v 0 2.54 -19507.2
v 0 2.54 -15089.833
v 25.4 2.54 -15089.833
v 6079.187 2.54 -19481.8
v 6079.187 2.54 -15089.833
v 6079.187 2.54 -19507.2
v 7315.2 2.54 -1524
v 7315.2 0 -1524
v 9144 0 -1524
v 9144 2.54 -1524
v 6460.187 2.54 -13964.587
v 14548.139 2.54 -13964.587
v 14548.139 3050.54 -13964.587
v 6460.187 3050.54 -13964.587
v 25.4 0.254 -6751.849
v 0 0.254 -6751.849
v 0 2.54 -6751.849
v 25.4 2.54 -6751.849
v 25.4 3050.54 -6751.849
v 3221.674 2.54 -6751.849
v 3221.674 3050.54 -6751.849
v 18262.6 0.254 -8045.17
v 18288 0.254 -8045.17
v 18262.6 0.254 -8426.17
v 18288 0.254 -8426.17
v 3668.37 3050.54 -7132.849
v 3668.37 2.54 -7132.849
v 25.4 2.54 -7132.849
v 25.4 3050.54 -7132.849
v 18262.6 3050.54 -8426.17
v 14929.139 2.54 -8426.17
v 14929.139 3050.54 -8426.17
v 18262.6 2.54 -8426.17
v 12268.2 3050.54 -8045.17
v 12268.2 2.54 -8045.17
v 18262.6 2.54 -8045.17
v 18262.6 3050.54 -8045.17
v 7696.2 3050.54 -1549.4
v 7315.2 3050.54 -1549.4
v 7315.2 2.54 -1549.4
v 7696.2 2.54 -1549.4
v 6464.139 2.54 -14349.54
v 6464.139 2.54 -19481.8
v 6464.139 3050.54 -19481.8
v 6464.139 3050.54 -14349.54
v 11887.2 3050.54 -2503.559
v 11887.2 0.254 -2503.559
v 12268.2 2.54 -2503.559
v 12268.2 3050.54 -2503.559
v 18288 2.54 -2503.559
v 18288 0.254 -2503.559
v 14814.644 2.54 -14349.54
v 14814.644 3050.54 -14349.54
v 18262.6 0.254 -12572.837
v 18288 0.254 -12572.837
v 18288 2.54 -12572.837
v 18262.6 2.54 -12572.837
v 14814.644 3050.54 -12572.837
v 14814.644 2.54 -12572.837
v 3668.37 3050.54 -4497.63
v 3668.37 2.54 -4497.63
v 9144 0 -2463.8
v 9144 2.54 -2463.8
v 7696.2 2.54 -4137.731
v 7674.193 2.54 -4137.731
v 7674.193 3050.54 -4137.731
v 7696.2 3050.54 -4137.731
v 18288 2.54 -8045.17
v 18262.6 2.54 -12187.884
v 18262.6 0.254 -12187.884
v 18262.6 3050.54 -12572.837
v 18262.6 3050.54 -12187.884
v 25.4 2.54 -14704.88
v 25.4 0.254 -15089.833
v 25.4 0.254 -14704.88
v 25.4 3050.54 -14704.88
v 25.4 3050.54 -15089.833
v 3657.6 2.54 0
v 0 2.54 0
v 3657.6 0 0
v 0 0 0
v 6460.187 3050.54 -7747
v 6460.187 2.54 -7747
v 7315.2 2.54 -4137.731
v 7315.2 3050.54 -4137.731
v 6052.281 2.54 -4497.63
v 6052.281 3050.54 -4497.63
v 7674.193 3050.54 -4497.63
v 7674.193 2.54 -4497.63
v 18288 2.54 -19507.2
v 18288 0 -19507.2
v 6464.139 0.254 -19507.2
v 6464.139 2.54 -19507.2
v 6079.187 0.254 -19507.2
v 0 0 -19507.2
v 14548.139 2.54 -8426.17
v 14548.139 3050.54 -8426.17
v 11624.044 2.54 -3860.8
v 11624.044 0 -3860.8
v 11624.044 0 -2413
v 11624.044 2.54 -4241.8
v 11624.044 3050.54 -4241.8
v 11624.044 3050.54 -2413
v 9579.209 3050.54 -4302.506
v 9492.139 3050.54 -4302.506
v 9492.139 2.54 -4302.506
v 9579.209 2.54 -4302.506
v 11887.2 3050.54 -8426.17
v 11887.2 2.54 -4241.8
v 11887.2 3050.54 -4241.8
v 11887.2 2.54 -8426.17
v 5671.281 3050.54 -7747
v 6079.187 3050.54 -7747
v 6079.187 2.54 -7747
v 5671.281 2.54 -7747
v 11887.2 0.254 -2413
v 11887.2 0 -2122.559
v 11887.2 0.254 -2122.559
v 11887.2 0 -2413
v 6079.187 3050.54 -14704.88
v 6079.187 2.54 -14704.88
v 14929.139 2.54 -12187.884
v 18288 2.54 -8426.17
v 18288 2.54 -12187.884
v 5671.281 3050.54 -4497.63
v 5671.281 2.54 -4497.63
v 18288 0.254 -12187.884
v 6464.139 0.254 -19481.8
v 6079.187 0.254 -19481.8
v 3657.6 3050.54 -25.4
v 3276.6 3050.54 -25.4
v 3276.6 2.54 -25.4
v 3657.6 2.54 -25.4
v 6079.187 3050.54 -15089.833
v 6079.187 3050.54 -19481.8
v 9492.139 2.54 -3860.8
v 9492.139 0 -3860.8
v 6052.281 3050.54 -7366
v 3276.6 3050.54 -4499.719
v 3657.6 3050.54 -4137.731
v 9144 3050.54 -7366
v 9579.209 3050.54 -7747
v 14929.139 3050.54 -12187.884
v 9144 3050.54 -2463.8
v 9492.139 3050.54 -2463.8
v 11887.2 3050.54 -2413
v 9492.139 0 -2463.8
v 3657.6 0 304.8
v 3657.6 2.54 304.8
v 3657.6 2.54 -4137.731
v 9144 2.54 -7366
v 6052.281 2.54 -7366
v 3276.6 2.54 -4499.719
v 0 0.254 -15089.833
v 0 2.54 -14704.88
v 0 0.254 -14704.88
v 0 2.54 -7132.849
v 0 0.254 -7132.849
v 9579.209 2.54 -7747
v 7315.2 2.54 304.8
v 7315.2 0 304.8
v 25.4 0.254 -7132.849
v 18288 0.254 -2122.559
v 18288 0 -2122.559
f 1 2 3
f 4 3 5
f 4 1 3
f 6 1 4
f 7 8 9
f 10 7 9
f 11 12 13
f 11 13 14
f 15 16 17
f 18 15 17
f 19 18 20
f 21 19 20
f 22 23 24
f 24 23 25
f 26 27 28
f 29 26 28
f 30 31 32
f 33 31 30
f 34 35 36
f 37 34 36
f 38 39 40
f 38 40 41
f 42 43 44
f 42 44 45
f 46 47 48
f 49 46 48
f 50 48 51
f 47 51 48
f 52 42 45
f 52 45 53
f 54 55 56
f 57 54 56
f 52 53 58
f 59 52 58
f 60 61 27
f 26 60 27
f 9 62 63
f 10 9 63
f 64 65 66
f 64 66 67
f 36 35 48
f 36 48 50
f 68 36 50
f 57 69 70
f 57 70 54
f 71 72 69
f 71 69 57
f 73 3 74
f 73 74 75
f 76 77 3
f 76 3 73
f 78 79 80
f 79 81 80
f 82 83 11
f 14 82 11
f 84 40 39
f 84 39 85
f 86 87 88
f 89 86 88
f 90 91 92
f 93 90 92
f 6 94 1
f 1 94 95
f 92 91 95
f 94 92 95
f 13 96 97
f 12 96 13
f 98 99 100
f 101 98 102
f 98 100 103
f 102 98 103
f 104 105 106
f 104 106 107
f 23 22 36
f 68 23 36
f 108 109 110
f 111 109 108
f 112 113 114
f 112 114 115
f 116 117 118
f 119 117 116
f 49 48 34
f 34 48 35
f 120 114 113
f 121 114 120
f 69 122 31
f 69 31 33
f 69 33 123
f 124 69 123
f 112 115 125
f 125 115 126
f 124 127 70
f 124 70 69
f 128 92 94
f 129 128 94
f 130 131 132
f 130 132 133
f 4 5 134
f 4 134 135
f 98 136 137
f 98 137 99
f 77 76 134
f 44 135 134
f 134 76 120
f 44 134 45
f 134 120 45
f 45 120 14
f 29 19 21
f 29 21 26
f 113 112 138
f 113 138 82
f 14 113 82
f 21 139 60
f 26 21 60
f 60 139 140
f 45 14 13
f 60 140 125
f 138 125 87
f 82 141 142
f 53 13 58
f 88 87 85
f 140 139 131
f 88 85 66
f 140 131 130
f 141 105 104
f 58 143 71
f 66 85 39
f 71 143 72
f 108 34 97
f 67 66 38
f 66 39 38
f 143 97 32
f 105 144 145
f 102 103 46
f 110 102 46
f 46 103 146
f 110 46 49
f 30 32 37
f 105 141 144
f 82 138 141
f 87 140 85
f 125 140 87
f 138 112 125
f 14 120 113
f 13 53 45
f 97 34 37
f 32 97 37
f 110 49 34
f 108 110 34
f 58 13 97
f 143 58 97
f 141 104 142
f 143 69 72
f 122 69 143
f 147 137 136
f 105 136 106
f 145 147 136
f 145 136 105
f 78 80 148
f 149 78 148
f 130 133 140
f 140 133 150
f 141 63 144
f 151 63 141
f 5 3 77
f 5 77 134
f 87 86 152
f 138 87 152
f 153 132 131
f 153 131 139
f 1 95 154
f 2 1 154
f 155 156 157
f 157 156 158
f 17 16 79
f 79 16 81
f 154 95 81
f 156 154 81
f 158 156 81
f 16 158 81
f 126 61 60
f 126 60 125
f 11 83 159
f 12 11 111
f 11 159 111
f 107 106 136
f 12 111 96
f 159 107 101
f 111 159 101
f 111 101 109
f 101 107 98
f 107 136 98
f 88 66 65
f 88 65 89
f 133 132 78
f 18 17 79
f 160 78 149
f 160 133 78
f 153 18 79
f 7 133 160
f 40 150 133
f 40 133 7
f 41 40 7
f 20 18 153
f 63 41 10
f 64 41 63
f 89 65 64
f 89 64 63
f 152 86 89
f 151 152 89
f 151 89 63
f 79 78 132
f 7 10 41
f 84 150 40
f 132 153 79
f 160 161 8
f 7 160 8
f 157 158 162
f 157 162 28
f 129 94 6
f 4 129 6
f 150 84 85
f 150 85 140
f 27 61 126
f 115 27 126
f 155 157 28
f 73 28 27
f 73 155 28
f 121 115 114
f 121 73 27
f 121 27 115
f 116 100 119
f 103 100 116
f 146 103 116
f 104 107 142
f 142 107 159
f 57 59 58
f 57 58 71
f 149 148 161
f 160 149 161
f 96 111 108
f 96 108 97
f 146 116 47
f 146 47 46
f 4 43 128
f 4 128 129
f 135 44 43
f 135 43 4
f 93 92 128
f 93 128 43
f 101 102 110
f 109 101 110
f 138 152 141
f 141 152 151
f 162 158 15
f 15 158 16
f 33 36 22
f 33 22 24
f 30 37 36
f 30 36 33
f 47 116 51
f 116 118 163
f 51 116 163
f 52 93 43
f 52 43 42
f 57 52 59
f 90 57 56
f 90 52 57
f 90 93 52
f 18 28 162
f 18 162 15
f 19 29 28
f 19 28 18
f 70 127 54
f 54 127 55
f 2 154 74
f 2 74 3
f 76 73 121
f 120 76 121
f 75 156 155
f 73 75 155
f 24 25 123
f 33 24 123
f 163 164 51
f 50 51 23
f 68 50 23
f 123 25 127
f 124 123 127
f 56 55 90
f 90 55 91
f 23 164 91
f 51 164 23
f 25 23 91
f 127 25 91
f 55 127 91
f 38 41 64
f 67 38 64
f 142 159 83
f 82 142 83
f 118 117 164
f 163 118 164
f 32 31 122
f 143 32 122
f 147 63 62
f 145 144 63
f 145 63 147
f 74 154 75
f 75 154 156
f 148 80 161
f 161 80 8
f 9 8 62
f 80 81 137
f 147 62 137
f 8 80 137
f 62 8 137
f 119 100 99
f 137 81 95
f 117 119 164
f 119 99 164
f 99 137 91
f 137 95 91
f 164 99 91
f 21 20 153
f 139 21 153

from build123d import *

# Parameters (mm, degrees)
BOSS_EXTRUDE1_DEPTH  = 2.54
BOSS_EXTRUDE2_DEPTH  = 3048
SKETCH3_W            = 6079.186928171
SKETCH3_H            = 384.95236651
BOSS_EXTRUDE3_DEPTH  = 3048
SKETCH4_W            = 6400.8
SKETCH4_H            = 381
BOSS_EXTRUDE4_DEPTH  = 3048
SKETCH5_W            = 435.20922465
SKETCH5_H            = 5334
BOSS_EXTRUDE5_DEPTH  = 3048
SKETCH6_W            = 381
SKETCH6_H            = 5922.610446976
BOSS_EXTRUDE7_DEPTH  = 3048
SKETCH7_W            = 6019.8
SKETCH7_H            = 381
BOSS_EXTRUDE8_DEPTH  = 3048
SKETCH8_W            = 381
SKETCH8_H            = 2613.731165123
BOSS_EXTRUDE9_DEPTH  = 3048
SKETCH9_W            = 381
SKETCH9_H            = 4182.504999838
BOSS_EXTRUDE10_DEPTH = 3048
SKETCH10_W           = 4005.822591779
SKETCH10_H           = 359.898893292
BOSS_EXTRUDE11_DEPTH = 3048
BOSS_EXTRUDE12_DEPTH = 3048
BOSS_EXTRUDE13_DEPTH = 3048
SKETCH14_W           = 381
SKETCH14_H           = 6217.587376367
BOSS_EXTRUDE15_DEPTH = 3048
SKETCH16_W           = 6400.8
SKETCH16_H           = 2122.559144169
CUT_EXTRUDE2_DEPTH   = 3048
SKETCH18_W           = 381
SKETCH18_H           = 3761.714555176
BOSS_EXTRUDE16_DEPTH = 3048
BOSS_EXTRUDE17_DEPTH = 3048
SKETCH20_W           = 381
SKETCH20_H           = 3048
CUT_EXTRUDE3_DEPTH   = 25.4
SKETCH21_W           = 381
SKETCH21_H           = 3048
CUT_EXTRUDE4_DEPTH   = 25.4
SKETCH22_W           = 2307.99077535
SKETCH22_H           = 3048
BOSS_EXTRUDE18_DEPTH = 1828.8
SKETCH23_W           = 2131.904617106
SKETCH23_H           = 3050.54
CUT_EXTRUDE5_DEPTH   = 1447.8
SKETCH24_W           = 348.138899176
SKETCH24_H           = 3050.54
CUT_EXTRUDE6_DEPTH   = 50.8
SKETCH26_W           = 2131.904617106
SKETCH26_H           = 3048
CUT_EXTRUDE7_DEPTH   = 441.706
SKETCH28_W           = 6400.8
SKETCH28_H           = 3050.286
CUT_EXTRUDE9_DEPTH   = 381
SKETCH29_W           = 384.95236651
SKETCH29_H           = 3050.286
CUT_EXTRUDE10_DEPTH  = 25.4
SKETCH30_W           = 381
SKETCH30_H           = 3050.286
CUT_EXTRUDE11_DEPTH  = 25.4
SKETCH31_W           = 381
SKETCH31_H           = 3050.286
CUT_EXTRUDE12_DEPTH  = 25.4
SKETCH32_W           = 384.95236651
SKETCH32_H           = 3050.286
CUT_EXTRUDE13_DEPTH  = 25.4
SKETCH33_W           = 384.95236651
SKETCH33_H           = 3050.286
CUT_EXTRUDE14_DEPTH  = 25.4


with BuildPart() as part:
    # Sketch1 → Boss-Extrude1 (new body)
    with BuildSketch(Plane(origin=(0, 0, 0), x_dir=(1, 0, 0), z_dir=(0, 1, 0))):
        Polygon((3657.6, 0), (3657.6, -304.8), (7315.2, -304.8), (7315.2, 0), (7315.2, 1524), (9144, 1524), (9144, 2413), (11887.2, 2413), (11887.2, 0), (18288, 0), (18288, 19507.2), (0, 19507.2), (0, 0), align=None)
    extrude(amount=BOSS_EXTRUDE1_DEPTH)

    # Sketch2 → Boss-Extrude2 (add)
    with BuildSketch(Plane(origin=(0, 2.54, 0), x_dir=(1, 0, 0), z_dir=(0, 1, 0))):
        Polygon((6079.186928171, 13964.587376367), (6079.186928171, 19507.2), (6464.139294681, 19507.2), (6464.139294681, 14349.539742877), (14814.644475897, 14349.539742877), (14814.644475897, 12572.836512831), (18288, 12572.836512831), (18288, 12187.884146321), (14548.13899139, 12187.884146321), (14548.13899139, 13964.587376367), align=None)
    extrude(amount=BOSS_EXTRUDE2_DEPTH)

    # Sketch3 → Boss-Extrude3 (add)
    with BuildSketch(Plane(origin=(0, 2.54, 0), x_dir=(1, 0, 0), z_dir=(0, 1, 0))):
        with Locations((3039.593464086, 14897.356572141)):
            Rectangle(SKETCH3_W, SKETCH3_H)
    extrude(amount=BOSS_EXTRUDE3_DEPTH)

    # Sketch4 → Boss-Extrude4 (add)
    with BuildSketch(Plane(origin=(0, 2.54, 0), x_dir=(1, 0, 0), z_dir=(0, 1, 0))):
        with Locations((15087.6, 2313.059144169)):
            Rectangle(SKETCH4_W, SKETCH4_H)
    extrude(amount=BOSS_EXTRUDE4_DEPTH)

    # Sketch5 → Boss-Extrude5 (add)
    with BuildSketch(Plane(origin=(0, 2.54, 0), x_dir=(1, 0, 0), z_dir=(0, 1, 0))):
        with Locations((9361.604612325, 5080)):
            Rectangle(SKETCH5_W, SKETCH5_H)
    extrude(amount=BOSS_EXTRUDE5_DEPTH)

    # Sketch6 → Boss-Extrude7 (add)
    with BuildSketch(Plane(origin=(0, 2.54, 0), x_dir=(1, 0, 0), z_dir=(0, 1, 0))):
        with Locations((12077.7, 5464.864367657)):
            Rectangle(SKETCH6_W, SKETCH6_H)
    extrude(amount=BOSS_EXTRUDE7_DEPTH)

    # Sketch7 → Boss-Extrude8 (add)
    with BuildSketch(Plane(origin=(0, 2.54, 0), x_dir=(1, 0, 0), z_dir=(0, 1, 0))):
        with Locations((15278.1, 8235.669591145)):
            Rectangle(SKETCH7_W, SKETCH7_H)
    extrude(amount=BOSS_EXTRUDE8_DEPTH)

    # Sketch8 → Boss-Extrude9 (add)
    with BuildSketch(Plane(origin=(0, 2.54, 0), x_dir=(1, 0, 0), z_dir=(0, 1, 0))):
        with Locations((7505.7, 2830.865582562)):
            Rectangle(SKETCH8_W, SKETCH8_H)
    extrude(amount=BOSS_EXTRUDE9_DEPTH)

    # Sketch9 → Boss-Extrude10 (add)
    with BuildSketch(Plane(origin=(0, 2.54, 0), x_dir=(1, 0, 0), z_dir=(0, 1, 0))):
        with Locations((3467.1, 2091.252499919)):
            Rectangle(SKETCH9_W, SKETCH9_H)
    extrude(amount=BOSS_EXTRUDE10_DEPTH)

    # Sketch10 → Boss-Extrude11 (add)
    with BuildSketch(Plane(origin=(0, 2.54, 0), x_dir=(1, 0, 0), z_dir=(0, 1, 0))):
        with Locations((5671.281263235, 4317.680611769)):
            Rectangle(SKETCH10_W, SKETCH10_H)
    extrude(amount=BOSS_EXTRUDE11_DEPTH)

    # Sketch11 → Boss-Extrude12 (add)
    with BuildSketch(Plane(origin=(0, 2.54, 0), x_dir=(1, 0, 0), z_dir=(0, 1, 0))):
        Polygon((3276.6, 4182.504999838), (3276.6, 4499.719299199), (3668.369967345, 4497.630058415), (3668.369967345, 4137.731165123), (3657.6, 4137.731165123), (3657.6, 4182.504999838), align=None)
    extrude(amount=BOSS_EXTRUDE12_DEPTH)

    # Sketch13 → Boss-Extrude13 (add)
    with BuildSketch(Plane(origin=(0, 2.54, 0), x_dir=(1, 0, 0), z_dir=(0, 1, 0))):
        Polygon((9144, 7747), (5671.281263235, 7747), (5671.281263235, 4497.630058415), (6052.281263235, 4497.630058415), (6052.281263235, 7366), (9144, 7366), align=None)
    extrude(amount=BOSS_EXTRUDE13_DEPTH)

    # Sketch14 → Boss-Extrude15 (add)
    with BuildSketch(Plane(origin=(0, 2.54, 0), x_dir=(1, 0, 0), z_dir=(0, 1, 0))):
        with Locations((6269.686928171, 10855.793688184)):
            Rectangle(SKETCH14_W, SKETCH14_H)
    extrude(amount=BOSS_EXTRUDE15_DEPTH)

    # Sketch16 → Cut-Extrude2 (cut)
    with BuildSketch(Plane(origin=(0, 2.54, 0), x_dir=(1, 0, 0), z_dir=(0, 1, 0))):
        with Locations((15087.6, 1061.279572085)):
            Rectangle(SKETCH16_W, SKETCH16_H)
    extrude(amount=-CUT_EXTRUDE2_DEPTH, mode=Mode.SUBTRACT)

    # Sketch18 → Boss-Extrude16 (add)
    with BuildSketch(Plane(origin=(0, 2.54, 0), x_dir=(1, 0, 0), z_dir=(0, 1, 0))):
        with Locations((14738.63899139, 10307.026868733)):
            Rectangle(SKETCH18_W, SKETCH18_H)
    extrude(amount=BOSS_EXTRUDE16_DEPTH)

    # Sketch19 → Boss-Extrude17 (add)
    with BuildSketch(Plane(origin=(0, 2.54, 0), x_dir=(1, 0, 0), z_dir=(0, 1, 0))):
        Polygon((3276.6, 4499.719299199), (3668.369967345, 4497.630058415), (3668.369967345, 7132.849148223), (0, 7132.849148223), (0, 6751.849148223), (3221.67385658, 6751.849148223), align=None)
    extrude(amount=BOSS_EXTRUDE17_DEPTH)

    # Sketch20 → Cut-Extrude3 (cut)
    with BuildSketch(Plane.XY):
        with Locations((3467.1, 1526.54)):
            Rectangle(SKETCH20_W, SKETCH20_H)
    extrude(amount=-CUT_EXTRUDE3_DEPTH, mode=Mode.SUBTRACT)

    # Sketch21 → Cut-Extrude4 (cut)
    with BuildSketch(Plane.XY.offset(-1524)):
        with Locations((7505.7, 1526.54)):
            Rectangle(SKETCH21_W, SKETCH21_H)
    extrude(amount=-CUT_EXTRUDE4_DEPTH, mode=Mode.SUBTRACT)

    # Sketch22 → Boss-Extrude18 (add)
    with BuildSketch(Plane.XY.offset(-2413)):
        with Locations((10733.204612325, 1526.54)):
            Rectangle(SKETCH22_W, SKETCH22_H)
    extrude(amount=-BOSS_EXTRUDE18_DEPTH)

    # Sketch23 → Cut-Extrude5 (cut)
    with BuildSketch(Plane.XY.offset(-2413)):
        with Locations((10558.091207729, 1525.27)):
            Rectangle(SKETCH23_W, SKETCH23_H)
    extrude(amount=-CUT_EXTRUDE5_DEPTH, mode=Mode.SUBTRACT)

    # Sketch24 → Cut-Extrude6 (cut)
    with BuildSketch(Plane.XY.offset(-2413)):
        with Locations((9318.069449588, 1525.27)):
            Rectangle(SKETCH24_W, SKETCH24_H)
    extrude(amount=-CUT_EXTRUDE6_DEPTH, mode=Mode.SUBTRACT)

    # Sketch26 → Cut-Extrude7 (cut)
    with BuildSketch(Plane.XY.offset(-3860.8)):
        with Locations((10558.091207729, 1526.54)):
            Rectangle(SKETCH26_W, SKETCH26_H)
    extrude(amount=-CUT_EXTRUDE7_DEPTH, mode=Mode.SUBTRACT)

    # Sketch28 → Cut-Extrude9 (cut)
    with BuildSketch(Plane.XY.offset(-2122.559144169)):
        with Locations((15087.6, 1525.397)):
            Rectangle(SKETCH28_W, SKETCH28_H)
    extrude(amount=-CUT_EXTRUDE9_DEPTH, mode=Mode.SUBTRACT)

    # Sketch29 → Cut-Extrude10 (cut)
    with BuildSketch(Plane.ZY):
        with Locations((-14897.356572141, 1525.397)):
            Rectangle(SKETCH29_W, SKETCH29_H)
    extrude(amount=-CUT_EXTRUDE10_DEPTH, mode=Mode.SUBTRACT)

    # Sketch30 → Cut-Extrude11 (cut)
    with BuildSketch(Plane.ZY):
        with Locations((-6942.349148223, 1525.397)):
            Rectangle(SKETCH30_W, SKETCH30_H)
    extrude(amount=-CUT_EXTRUDE11_DEPTH, mode=Mode.SUBTRACT)

    # Sketch31 → Cut-Extrude12 (cut)
    with BuildSketch(Plane(origin=(18288, 0, 0), x_dir=(0, 0, -1), z_dir=(1, 0, 0))):
        with Locations((8235.669591145, 1525.397)):
            Rectangle(SKETCH31_W, SKETCH31_H)
    extrude(amount=-CUT_EXTRUDE12_DEPTH, mode=Mode.SUBTRACT)

    # Sketch32 → Cut-Extrude13 (cut)
    with BuildSketch(Plane(origin=(18288, 0, 0), x_dir=(0, 0, -1), z_dir=(1, 0, 0))):
        with Locations((12380.360329576, 1525.397)):
            Rectangle(SKETCH32_W, SKETCH32_H)
    extrude(amount=-CUT_EXTRUDE13_DEPTH, mode=Mode.SUBTRACT)

    # Sketch33 → Cut-Extrude14 (cut)
    with BuildSketch(Plane(origin=(0, 0, -19507.2), x_dir=(-1, 0, 0), z_dir=(0, 0, -1))):
        with Locations((-6271.663111426, 1525.397)):
            Rectangle(SKETCH33_W, SKETCH33_H)
    extrude(amount=-CUT_EXTRUDE14_DEPTH, mode=Mode.SUBTRACT)


solid = part.part
